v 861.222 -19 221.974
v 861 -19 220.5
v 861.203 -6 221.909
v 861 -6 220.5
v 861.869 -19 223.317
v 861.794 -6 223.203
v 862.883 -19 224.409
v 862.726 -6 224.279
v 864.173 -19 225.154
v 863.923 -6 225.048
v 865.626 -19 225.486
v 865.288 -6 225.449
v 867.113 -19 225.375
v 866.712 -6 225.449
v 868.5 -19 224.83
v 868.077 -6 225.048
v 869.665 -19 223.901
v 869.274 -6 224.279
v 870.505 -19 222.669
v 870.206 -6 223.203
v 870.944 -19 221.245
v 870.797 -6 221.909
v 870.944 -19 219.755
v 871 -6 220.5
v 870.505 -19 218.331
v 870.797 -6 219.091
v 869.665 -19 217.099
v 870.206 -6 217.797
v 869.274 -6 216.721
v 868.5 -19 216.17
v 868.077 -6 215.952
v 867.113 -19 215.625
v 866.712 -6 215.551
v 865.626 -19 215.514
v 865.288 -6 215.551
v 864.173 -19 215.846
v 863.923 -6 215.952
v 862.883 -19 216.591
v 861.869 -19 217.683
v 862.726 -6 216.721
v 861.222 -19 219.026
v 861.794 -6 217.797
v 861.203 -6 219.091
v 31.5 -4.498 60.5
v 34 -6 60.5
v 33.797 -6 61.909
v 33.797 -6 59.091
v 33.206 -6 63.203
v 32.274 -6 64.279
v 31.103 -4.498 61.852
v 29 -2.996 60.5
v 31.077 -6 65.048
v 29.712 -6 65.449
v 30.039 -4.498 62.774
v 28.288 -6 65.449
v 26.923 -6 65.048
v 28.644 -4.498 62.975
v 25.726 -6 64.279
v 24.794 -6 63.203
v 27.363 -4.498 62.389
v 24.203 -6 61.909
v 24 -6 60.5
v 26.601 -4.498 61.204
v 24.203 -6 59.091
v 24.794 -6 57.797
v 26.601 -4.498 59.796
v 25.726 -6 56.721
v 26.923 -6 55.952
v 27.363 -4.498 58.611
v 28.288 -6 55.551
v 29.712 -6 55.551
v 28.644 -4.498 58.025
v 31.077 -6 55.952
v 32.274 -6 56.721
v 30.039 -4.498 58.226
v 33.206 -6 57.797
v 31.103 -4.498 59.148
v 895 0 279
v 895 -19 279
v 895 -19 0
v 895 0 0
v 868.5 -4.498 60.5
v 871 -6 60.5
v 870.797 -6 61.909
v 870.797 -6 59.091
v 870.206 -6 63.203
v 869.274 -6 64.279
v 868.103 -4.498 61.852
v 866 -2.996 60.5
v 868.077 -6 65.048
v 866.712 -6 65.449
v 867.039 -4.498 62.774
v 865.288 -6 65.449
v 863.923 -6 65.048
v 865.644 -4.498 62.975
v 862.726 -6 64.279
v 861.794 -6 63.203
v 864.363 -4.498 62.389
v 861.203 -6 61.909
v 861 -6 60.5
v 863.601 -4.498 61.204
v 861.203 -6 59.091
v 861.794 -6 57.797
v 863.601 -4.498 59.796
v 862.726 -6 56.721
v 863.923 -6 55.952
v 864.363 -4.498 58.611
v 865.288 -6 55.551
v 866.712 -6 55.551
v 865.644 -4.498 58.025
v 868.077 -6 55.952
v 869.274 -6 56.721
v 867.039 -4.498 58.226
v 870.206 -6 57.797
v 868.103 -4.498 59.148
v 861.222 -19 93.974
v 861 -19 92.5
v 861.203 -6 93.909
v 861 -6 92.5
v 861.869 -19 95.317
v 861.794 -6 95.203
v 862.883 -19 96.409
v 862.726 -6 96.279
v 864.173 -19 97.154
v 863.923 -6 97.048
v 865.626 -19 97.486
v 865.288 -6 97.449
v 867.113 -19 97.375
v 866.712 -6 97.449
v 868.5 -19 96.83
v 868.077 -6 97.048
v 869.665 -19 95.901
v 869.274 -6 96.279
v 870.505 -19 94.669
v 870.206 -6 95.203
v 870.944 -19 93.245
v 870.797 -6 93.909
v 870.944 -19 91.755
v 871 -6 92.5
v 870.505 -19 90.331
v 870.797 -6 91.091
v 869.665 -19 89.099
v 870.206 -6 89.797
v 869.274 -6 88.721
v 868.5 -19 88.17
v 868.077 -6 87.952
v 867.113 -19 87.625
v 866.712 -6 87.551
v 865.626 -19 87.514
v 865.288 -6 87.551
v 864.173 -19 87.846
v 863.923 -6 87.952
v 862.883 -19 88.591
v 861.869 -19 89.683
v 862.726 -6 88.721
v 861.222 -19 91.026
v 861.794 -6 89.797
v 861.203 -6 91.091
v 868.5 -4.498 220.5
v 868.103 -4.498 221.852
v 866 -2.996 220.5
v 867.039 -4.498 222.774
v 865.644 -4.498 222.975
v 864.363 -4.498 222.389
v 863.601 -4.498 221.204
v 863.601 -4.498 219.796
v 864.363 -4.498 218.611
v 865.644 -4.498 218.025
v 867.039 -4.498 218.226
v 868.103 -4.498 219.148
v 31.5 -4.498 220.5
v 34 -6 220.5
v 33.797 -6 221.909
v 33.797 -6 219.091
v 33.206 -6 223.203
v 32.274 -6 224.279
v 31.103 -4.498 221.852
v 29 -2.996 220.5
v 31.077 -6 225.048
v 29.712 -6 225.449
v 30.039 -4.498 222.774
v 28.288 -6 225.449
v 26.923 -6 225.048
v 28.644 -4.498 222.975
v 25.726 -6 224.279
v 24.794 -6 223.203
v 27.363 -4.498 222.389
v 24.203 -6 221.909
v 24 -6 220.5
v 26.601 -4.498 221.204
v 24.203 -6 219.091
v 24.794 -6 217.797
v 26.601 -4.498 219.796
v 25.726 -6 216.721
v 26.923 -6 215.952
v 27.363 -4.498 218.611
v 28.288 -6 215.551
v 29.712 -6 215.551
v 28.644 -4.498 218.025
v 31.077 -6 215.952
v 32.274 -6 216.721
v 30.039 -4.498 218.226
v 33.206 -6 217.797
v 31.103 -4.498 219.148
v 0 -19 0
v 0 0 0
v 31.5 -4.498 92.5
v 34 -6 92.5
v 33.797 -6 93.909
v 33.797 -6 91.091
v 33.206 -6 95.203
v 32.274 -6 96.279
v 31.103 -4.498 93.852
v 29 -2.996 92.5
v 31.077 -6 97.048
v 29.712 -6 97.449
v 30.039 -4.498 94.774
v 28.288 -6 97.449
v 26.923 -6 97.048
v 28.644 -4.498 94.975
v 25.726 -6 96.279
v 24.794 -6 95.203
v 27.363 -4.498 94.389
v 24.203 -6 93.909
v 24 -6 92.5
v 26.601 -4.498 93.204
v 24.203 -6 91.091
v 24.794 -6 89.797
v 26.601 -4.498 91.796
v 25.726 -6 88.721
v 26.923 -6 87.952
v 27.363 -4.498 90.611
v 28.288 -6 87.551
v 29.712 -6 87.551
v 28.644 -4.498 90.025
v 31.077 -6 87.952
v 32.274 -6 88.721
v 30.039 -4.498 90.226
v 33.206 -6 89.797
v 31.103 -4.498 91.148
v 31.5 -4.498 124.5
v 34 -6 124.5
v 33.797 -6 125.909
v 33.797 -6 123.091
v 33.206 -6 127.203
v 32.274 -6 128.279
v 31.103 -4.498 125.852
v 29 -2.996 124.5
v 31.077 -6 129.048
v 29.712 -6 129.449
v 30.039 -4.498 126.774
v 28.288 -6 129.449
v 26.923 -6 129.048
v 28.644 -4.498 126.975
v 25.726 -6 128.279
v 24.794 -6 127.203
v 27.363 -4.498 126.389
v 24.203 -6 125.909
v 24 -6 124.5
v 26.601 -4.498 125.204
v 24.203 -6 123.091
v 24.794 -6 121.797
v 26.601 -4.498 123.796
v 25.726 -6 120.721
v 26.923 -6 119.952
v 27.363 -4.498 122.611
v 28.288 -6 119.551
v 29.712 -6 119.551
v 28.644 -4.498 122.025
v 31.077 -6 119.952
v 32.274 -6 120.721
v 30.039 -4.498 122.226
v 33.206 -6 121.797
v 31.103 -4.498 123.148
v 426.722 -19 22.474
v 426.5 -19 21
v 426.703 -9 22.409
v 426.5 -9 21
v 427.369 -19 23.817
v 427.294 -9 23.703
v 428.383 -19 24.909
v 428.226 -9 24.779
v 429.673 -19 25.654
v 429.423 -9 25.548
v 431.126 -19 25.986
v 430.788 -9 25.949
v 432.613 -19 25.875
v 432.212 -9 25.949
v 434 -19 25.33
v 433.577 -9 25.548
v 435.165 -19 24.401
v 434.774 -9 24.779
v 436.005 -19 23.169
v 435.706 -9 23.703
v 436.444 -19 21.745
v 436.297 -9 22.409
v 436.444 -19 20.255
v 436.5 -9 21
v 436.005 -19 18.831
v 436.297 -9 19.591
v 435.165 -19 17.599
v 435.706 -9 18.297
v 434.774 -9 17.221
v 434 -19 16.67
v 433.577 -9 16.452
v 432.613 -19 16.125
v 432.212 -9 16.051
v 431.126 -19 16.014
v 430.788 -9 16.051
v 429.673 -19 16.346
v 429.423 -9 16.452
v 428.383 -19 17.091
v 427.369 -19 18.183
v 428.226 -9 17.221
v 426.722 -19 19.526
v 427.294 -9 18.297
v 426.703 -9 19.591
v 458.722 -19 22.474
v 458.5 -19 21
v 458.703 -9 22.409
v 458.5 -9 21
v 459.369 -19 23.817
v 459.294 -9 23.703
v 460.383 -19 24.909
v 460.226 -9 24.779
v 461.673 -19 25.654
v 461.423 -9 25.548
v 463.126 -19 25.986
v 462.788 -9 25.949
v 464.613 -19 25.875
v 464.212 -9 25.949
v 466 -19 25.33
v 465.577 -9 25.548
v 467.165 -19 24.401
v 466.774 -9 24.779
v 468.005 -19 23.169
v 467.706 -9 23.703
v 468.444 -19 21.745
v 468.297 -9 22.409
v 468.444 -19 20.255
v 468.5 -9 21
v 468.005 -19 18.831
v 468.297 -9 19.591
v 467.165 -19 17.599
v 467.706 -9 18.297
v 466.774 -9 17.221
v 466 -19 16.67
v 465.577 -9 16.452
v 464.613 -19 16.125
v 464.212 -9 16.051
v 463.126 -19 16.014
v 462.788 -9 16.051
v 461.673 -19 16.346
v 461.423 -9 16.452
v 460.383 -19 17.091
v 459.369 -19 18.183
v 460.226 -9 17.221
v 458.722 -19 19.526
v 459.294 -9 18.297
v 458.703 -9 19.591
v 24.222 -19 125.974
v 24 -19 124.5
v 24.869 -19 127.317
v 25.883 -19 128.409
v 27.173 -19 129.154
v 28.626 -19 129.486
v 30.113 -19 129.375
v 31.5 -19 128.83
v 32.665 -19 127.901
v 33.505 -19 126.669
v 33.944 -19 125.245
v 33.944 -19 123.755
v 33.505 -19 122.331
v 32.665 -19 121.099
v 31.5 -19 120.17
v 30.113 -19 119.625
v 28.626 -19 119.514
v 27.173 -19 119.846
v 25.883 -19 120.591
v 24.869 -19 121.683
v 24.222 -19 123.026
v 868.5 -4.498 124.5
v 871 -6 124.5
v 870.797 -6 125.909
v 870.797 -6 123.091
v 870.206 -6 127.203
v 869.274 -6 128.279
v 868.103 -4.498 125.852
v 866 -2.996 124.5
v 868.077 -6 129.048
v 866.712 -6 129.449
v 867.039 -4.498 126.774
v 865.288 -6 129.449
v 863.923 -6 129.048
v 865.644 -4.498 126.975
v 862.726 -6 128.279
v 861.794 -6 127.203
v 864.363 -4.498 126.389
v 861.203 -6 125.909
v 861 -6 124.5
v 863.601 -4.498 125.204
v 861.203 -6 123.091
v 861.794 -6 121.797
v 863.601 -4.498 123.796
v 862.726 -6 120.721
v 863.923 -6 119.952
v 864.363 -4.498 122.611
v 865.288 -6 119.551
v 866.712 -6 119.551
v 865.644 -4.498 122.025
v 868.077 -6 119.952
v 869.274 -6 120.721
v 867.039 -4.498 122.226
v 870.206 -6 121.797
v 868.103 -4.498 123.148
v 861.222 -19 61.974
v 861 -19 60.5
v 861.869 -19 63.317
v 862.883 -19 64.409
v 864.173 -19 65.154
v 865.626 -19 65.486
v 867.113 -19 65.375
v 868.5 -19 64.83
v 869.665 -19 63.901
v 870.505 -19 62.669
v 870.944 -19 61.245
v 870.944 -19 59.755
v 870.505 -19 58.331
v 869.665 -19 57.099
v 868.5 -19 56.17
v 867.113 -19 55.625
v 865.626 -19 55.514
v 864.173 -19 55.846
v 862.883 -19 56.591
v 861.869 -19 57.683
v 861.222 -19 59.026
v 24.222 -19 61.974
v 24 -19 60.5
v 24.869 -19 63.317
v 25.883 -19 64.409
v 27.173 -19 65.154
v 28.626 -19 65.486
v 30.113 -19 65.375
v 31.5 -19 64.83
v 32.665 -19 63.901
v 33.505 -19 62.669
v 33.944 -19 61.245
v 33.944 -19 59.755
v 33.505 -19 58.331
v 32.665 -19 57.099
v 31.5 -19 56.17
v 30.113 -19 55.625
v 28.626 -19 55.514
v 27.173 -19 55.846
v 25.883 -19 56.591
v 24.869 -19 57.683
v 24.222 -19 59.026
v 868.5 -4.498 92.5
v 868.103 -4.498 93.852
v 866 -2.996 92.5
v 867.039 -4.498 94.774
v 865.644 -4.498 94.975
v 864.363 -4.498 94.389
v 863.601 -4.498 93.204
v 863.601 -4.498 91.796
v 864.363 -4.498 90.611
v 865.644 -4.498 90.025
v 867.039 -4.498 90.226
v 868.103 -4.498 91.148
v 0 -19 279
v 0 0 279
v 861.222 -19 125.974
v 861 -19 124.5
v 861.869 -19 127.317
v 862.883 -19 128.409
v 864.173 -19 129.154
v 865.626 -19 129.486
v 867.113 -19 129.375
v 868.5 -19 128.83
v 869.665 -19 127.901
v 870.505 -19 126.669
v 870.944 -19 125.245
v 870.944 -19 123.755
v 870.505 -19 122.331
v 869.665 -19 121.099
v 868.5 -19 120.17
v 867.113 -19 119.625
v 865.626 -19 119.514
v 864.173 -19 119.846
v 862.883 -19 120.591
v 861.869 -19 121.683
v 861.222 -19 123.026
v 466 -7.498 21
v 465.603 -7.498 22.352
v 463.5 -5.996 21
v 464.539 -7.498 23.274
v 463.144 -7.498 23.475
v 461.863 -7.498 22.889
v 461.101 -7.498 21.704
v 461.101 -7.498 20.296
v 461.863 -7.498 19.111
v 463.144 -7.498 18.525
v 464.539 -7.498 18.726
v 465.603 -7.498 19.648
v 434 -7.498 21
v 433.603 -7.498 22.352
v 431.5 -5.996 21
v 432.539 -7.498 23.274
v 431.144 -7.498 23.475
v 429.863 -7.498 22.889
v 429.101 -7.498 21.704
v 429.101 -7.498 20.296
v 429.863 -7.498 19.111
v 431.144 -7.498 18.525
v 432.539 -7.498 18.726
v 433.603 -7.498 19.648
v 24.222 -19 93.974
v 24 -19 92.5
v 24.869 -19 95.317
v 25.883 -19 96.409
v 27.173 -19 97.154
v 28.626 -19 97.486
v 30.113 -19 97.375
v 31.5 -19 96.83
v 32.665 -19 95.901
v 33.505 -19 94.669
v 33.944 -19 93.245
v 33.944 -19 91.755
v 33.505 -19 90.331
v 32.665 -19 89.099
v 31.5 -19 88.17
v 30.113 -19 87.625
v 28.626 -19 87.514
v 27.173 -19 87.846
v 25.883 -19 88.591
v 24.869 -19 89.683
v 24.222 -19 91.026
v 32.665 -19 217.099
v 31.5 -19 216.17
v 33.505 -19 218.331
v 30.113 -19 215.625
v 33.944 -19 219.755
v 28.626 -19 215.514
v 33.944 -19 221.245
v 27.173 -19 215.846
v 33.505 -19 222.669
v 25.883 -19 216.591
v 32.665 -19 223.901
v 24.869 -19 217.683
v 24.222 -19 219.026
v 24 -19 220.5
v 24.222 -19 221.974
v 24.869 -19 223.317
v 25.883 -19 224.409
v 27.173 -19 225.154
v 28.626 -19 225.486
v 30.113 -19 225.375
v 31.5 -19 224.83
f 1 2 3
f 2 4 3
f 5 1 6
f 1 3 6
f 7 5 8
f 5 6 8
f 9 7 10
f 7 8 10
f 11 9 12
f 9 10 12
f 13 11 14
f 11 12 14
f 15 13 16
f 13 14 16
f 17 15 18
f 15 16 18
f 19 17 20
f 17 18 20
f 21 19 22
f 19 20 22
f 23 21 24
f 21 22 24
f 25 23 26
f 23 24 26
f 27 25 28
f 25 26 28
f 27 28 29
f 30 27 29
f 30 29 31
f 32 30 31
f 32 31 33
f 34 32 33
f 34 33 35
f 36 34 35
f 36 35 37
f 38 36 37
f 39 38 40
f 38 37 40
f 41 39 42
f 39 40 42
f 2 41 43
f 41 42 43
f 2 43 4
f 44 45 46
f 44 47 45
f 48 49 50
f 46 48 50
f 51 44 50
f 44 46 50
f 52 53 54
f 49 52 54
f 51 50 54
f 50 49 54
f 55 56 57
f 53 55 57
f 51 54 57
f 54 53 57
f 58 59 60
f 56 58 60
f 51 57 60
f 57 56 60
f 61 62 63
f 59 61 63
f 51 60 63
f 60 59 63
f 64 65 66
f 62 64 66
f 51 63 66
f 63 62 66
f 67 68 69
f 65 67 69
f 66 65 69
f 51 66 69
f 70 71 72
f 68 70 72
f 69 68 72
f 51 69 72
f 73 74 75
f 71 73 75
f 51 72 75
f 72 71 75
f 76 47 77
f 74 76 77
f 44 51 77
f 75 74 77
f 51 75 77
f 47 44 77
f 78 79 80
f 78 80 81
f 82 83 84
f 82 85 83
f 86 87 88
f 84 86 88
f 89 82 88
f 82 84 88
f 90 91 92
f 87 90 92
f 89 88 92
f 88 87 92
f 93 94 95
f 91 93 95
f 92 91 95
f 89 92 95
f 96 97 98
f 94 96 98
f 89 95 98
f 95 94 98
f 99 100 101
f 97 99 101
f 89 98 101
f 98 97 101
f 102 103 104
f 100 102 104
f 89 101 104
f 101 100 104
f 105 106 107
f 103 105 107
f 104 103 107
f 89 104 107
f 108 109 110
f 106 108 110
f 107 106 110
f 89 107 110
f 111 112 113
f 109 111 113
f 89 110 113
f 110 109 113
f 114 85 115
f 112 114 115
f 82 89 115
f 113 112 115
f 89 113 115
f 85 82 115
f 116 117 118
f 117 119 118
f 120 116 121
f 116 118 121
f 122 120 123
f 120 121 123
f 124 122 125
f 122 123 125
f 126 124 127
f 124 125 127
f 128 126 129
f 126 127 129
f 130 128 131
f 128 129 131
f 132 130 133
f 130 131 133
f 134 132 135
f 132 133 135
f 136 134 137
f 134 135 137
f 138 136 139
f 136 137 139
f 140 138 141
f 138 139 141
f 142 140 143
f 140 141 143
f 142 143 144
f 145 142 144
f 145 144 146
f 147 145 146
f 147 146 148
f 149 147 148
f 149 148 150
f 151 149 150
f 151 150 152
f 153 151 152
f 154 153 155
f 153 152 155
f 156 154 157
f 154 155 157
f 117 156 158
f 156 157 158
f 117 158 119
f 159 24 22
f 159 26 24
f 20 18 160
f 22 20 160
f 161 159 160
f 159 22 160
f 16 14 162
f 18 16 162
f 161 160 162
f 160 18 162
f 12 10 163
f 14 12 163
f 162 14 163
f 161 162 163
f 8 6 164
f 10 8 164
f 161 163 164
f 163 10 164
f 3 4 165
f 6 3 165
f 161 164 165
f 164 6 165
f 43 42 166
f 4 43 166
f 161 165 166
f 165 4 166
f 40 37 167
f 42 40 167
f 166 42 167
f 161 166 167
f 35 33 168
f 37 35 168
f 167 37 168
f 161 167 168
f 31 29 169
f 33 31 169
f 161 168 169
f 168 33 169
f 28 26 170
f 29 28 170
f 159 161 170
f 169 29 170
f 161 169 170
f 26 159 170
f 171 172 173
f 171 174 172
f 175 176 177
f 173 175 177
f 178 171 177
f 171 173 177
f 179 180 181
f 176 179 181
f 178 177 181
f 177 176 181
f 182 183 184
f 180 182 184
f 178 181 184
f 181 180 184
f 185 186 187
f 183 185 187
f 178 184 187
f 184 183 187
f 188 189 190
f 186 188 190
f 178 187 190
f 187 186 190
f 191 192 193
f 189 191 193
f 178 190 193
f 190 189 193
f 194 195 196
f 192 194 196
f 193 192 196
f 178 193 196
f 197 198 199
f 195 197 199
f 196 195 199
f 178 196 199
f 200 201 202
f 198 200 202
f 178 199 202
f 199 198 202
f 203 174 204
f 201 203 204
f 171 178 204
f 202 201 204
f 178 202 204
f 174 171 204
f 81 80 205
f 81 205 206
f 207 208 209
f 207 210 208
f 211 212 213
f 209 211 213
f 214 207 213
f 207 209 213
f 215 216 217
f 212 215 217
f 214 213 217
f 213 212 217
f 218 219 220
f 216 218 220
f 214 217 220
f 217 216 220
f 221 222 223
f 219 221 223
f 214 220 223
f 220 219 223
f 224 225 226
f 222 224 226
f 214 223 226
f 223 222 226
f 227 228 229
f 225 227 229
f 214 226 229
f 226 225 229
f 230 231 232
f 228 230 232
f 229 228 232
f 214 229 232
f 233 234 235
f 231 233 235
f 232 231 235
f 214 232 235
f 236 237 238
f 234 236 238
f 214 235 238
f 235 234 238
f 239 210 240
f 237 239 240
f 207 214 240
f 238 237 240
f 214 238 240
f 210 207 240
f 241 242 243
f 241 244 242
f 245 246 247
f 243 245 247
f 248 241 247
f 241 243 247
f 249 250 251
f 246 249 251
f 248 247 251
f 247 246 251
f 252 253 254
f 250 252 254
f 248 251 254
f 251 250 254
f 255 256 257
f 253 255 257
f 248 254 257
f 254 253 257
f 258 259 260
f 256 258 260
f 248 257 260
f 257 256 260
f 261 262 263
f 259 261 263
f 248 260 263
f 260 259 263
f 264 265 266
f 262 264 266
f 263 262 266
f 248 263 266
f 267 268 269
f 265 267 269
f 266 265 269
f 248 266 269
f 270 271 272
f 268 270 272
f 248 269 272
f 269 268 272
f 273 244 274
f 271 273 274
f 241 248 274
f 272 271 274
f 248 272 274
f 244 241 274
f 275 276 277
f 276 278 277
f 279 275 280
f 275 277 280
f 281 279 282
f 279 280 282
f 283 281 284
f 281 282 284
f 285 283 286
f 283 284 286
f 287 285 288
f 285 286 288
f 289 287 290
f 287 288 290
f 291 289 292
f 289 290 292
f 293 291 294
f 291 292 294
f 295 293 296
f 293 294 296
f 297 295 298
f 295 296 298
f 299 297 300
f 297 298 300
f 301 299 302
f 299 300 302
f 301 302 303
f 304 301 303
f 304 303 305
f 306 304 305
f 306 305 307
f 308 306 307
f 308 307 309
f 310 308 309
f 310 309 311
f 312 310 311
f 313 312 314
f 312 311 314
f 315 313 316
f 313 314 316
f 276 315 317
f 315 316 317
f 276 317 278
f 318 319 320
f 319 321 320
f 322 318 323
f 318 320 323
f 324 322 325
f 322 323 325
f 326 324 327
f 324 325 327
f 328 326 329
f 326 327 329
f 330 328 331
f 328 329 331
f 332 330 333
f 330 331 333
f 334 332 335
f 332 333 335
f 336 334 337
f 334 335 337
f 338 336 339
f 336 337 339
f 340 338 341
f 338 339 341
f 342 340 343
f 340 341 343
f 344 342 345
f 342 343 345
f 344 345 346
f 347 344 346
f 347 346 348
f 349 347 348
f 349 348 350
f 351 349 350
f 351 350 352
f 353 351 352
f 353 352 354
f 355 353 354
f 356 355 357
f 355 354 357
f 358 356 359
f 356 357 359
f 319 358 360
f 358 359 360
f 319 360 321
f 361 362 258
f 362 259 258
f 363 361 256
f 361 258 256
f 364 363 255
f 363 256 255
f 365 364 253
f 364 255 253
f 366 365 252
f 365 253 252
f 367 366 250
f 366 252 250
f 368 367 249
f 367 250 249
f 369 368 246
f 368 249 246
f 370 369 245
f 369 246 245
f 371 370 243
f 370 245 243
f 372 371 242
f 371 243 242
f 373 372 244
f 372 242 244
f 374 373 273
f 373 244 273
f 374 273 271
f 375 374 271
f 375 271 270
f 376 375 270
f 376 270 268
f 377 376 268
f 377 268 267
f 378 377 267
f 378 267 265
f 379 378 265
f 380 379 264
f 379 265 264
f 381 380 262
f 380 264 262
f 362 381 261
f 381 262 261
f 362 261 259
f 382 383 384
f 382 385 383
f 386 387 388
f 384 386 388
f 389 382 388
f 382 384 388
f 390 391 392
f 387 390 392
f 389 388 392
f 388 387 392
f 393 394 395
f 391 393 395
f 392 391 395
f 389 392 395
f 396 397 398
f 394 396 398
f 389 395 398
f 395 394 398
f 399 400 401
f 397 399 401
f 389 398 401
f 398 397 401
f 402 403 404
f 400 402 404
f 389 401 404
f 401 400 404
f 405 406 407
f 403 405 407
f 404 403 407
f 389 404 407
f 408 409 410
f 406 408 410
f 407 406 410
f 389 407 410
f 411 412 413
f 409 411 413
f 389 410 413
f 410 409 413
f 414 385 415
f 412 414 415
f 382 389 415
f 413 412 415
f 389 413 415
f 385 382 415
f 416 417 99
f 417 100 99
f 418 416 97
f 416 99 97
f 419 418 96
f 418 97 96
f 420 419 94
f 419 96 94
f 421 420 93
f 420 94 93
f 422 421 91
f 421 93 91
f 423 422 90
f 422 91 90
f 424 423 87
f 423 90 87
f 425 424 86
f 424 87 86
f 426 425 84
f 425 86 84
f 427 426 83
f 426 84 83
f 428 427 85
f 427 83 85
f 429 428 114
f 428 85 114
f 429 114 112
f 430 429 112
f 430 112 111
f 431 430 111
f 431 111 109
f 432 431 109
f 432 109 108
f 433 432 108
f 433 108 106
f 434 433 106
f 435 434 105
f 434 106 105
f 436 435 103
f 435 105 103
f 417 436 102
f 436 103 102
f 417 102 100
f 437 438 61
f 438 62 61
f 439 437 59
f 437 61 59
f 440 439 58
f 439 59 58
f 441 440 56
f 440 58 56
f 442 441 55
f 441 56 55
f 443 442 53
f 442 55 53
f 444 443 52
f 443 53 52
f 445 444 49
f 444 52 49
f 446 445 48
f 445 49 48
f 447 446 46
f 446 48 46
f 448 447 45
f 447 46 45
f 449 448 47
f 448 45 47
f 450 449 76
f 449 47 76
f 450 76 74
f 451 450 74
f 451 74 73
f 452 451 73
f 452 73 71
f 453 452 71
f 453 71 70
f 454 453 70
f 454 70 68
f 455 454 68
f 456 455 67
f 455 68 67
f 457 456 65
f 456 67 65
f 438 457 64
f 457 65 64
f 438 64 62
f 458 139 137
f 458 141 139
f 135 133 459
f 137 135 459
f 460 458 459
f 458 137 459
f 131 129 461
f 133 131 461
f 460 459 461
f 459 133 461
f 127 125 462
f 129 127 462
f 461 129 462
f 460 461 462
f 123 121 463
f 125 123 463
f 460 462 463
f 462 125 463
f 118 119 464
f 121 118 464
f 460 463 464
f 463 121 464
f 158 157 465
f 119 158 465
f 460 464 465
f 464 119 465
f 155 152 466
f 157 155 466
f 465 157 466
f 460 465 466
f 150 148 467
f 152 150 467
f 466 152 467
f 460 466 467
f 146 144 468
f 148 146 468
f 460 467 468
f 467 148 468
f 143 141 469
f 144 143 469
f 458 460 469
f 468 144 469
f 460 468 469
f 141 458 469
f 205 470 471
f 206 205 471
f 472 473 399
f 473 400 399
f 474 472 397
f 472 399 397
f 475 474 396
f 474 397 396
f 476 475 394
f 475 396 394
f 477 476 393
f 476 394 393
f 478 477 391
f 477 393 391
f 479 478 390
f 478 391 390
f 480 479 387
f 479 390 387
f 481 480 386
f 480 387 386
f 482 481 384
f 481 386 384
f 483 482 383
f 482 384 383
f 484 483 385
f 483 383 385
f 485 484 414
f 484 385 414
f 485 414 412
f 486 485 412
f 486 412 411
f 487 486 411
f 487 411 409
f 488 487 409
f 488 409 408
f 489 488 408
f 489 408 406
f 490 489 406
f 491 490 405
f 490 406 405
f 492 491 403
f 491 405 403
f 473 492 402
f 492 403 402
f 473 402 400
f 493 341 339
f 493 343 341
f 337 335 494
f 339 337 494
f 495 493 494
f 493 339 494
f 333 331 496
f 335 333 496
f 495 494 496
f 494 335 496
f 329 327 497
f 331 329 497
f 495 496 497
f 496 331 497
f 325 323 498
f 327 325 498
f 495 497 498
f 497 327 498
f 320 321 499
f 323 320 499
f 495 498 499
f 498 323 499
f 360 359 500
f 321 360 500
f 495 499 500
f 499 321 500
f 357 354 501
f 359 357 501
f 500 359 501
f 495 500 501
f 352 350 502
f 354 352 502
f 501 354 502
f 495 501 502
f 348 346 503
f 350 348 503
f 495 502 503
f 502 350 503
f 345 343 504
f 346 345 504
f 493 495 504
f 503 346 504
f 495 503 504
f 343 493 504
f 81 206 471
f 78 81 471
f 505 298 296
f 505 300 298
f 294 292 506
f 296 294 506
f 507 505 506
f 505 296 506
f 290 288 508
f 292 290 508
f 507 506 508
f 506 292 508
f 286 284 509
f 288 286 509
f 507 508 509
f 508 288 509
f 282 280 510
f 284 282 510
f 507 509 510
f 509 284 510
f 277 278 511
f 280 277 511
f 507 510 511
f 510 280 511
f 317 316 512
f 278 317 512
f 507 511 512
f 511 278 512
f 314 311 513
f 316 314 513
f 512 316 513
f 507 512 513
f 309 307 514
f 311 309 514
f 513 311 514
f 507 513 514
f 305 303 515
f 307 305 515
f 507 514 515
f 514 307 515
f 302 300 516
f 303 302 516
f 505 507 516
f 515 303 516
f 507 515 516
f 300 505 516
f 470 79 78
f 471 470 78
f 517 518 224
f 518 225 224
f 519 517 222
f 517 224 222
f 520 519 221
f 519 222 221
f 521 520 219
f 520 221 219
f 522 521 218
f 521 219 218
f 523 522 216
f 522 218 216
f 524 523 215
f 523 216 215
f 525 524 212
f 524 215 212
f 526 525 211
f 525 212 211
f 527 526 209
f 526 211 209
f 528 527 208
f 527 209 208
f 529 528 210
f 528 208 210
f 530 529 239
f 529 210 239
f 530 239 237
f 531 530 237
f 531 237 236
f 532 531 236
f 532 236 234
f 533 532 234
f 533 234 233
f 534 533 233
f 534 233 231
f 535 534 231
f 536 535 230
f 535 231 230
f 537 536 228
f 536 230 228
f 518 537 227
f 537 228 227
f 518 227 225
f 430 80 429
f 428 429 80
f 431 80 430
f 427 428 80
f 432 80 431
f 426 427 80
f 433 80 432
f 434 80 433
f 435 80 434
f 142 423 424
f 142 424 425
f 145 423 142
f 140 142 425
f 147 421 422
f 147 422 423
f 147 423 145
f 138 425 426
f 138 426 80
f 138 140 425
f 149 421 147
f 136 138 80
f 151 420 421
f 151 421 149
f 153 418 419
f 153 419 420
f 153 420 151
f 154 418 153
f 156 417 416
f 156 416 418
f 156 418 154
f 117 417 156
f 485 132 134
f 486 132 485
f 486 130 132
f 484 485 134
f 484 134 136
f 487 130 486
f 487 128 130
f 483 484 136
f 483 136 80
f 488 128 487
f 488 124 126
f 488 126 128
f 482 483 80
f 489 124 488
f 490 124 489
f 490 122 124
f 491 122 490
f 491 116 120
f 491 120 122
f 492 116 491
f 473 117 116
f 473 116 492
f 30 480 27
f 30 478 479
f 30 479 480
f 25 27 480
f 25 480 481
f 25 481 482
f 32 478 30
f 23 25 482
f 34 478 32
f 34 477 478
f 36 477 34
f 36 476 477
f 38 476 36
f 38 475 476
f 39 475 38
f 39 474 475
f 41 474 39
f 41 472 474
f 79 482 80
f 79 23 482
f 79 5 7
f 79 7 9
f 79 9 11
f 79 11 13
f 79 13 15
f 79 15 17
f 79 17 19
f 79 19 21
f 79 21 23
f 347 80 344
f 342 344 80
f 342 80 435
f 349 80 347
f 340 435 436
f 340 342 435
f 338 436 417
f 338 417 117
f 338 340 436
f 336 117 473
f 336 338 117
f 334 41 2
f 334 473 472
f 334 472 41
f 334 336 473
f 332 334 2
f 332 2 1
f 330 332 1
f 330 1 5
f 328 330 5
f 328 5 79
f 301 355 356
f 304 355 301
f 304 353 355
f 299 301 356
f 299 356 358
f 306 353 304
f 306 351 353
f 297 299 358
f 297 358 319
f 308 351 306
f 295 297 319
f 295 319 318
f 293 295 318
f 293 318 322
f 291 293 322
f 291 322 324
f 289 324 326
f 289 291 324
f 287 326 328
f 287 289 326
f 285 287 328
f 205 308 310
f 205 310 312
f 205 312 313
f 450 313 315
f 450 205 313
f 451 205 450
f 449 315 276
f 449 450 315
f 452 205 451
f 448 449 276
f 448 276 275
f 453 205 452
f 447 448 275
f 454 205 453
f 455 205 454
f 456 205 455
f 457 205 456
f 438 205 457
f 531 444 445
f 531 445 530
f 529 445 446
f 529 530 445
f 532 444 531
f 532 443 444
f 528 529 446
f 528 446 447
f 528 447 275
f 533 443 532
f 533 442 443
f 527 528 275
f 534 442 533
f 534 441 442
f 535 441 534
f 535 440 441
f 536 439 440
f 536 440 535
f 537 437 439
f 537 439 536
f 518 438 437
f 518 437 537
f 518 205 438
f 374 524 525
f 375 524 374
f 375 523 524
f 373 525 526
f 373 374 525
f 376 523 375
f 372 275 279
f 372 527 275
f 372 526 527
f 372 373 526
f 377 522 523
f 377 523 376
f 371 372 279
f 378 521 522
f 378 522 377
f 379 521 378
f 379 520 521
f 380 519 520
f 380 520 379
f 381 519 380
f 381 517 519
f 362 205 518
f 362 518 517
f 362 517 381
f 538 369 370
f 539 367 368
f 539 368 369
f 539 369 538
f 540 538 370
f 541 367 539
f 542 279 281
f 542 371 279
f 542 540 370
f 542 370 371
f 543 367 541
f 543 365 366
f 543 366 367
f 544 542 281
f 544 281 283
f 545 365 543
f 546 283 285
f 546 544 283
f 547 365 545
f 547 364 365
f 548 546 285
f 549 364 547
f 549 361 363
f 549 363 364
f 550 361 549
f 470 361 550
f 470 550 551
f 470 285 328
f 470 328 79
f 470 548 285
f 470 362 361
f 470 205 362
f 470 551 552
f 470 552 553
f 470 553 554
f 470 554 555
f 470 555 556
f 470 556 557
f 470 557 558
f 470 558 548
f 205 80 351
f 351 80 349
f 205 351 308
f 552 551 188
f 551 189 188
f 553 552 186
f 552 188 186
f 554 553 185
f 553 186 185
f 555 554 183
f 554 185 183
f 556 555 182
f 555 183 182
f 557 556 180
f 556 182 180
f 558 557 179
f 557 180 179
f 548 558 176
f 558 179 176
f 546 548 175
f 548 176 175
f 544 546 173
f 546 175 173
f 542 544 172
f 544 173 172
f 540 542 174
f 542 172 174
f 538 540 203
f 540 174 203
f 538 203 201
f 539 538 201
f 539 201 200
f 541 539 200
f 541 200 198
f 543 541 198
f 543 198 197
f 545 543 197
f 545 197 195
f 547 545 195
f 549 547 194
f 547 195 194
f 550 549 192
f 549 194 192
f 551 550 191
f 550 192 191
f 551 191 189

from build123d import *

# Parameters (mm, degrees)
F0_W     = 19
F0_H     = 279
F1_DEPTH = 895
F3_D     = 10
F3_DEPTH = 13
F3_TIP   = 3.0043030951
F4_D     = 10
F4_DEPTH = 10
F4_TIP   = 3.0043030951


with BuildPart() as f1:
    # F0 (on Right) → F1 (new body)
    with BuildSketch(Plane.YZ):
        with Locations((-9.5, 139.5)):
            Rectangle(F0_W, F0_H)
    extrude(amount=F1_DEPTH)

    # F3
    with Locations(Plane.XZ.offset(19)):
        with Locations((29, 220.5), (29, 124.5), (29, 92.5), (29, 60.5), (866, 60.5), (866, 92.5), (866, 124.5), (866, 220.5)):
            Hole(F3_D / 2, depth=F3_DEPTH)
            with Locations((0, 0, -(F3_DEPTH + F3_TIP / 2))):  # 118° drill point
                Cone(0, F3_D / 2, F3_TIP, mode=Mode.SUBTRACT)

    # F4
    with Locations(Plane.XZ.offset(19)):
        with Locations((431.5, 21), (463.5, 21)):
            Hole(F4_D / 2, depth=F4_DEPTH)
            with Locations((0, 0, -(F4_DEPTH + F4_TIP / 2))):  # 118° drill point
                Cone(0, F4_D / 2, F4_TIP, mode=Mode.SUBTRACT)


solid = f1.part
